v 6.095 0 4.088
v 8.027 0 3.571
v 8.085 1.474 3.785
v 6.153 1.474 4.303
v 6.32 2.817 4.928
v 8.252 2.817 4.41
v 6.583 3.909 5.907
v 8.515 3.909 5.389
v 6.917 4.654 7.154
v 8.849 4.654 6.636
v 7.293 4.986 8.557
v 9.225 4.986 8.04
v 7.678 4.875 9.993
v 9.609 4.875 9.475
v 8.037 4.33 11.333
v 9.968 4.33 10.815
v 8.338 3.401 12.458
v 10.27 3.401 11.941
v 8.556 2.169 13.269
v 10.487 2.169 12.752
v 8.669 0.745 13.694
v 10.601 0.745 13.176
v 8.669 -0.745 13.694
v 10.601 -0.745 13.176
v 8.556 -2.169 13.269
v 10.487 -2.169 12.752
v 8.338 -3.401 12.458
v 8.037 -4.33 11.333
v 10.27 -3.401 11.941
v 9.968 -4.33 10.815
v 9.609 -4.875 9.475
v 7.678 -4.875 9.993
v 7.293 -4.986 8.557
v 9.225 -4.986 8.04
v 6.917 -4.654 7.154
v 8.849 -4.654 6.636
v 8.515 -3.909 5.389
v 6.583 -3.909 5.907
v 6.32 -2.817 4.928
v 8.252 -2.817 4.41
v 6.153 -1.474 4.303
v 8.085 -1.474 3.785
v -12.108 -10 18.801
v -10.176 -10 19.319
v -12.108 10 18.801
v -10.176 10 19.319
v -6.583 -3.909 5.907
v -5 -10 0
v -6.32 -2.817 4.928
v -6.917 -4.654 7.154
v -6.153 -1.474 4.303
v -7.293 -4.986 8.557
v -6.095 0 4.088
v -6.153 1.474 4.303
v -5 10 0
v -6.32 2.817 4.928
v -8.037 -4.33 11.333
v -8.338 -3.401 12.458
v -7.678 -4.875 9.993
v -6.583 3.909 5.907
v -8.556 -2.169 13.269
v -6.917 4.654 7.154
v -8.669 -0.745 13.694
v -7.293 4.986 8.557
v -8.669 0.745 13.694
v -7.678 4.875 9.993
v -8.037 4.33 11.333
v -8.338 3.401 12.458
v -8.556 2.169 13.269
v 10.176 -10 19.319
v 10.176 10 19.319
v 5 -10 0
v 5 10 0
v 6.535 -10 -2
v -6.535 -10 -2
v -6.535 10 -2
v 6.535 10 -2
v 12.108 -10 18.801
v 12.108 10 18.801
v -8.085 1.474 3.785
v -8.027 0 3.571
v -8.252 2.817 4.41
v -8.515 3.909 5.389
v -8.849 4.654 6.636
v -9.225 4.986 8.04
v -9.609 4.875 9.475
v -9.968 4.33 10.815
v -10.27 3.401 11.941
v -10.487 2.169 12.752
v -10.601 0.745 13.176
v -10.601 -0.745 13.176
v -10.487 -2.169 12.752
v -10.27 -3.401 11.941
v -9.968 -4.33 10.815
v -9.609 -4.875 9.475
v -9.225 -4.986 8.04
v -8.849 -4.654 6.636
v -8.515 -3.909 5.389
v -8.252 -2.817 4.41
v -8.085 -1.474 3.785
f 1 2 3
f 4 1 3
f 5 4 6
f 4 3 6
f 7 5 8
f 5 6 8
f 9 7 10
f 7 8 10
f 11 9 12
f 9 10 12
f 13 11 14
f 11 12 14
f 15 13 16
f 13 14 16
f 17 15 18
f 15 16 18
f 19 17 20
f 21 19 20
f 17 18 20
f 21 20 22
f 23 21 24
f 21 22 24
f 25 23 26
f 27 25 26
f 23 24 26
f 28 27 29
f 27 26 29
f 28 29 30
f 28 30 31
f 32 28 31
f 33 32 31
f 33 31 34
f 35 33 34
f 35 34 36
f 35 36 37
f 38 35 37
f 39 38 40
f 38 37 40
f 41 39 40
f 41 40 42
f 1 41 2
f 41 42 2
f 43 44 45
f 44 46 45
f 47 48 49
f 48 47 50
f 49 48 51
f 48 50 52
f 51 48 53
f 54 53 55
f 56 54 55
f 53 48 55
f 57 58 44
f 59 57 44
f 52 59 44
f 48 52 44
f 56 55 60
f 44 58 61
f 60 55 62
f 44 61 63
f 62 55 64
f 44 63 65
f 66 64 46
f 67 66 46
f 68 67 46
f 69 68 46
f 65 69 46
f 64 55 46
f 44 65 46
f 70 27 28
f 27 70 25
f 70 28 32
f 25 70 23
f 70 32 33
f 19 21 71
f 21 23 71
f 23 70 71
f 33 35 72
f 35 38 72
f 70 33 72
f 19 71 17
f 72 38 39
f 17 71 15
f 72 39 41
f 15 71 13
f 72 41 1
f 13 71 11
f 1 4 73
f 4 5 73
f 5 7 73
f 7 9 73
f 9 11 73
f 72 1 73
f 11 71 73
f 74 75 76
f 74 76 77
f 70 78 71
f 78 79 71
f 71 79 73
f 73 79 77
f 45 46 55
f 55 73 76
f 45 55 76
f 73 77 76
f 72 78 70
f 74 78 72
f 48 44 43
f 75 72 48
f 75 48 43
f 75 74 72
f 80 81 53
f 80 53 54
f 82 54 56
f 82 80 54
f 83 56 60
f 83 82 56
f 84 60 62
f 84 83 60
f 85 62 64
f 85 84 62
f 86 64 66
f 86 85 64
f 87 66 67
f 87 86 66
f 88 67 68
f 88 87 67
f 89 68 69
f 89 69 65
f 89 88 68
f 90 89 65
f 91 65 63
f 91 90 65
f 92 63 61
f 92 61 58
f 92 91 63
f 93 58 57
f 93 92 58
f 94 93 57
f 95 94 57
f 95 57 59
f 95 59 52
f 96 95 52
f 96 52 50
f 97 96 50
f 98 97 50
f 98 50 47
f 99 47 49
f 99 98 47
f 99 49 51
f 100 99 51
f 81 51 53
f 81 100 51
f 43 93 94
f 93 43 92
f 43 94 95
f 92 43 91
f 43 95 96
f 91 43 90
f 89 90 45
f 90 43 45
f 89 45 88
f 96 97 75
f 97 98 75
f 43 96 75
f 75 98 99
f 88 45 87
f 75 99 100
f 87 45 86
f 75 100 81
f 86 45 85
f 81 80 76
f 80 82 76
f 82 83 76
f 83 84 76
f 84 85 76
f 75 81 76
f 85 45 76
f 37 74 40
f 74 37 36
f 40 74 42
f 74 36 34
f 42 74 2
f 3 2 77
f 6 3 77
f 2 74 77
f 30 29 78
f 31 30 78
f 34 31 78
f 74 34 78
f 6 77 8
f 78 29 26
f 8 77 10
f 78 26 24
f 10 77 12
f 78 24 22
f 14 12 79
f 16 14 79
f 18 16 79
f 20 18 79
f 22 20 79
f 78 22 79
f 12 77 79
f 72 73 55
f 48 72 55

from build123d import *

# Parameters (mm, degrees)
AUFSATZ_LINEAR_AUSTRAGEN1_DEPTH = 10
SKIZZE2_R                       = 5
SCHNITT_LINEAR_AUSTRAGEN1_DEPTH = 2


with BuildPart() as part:
    # Skizze1 → Aufsatz-Linear austragen1 (new body, symmetric)
    with BuildSketch(Plane(origin=(0, 0, 0), x_dir=(1, 0, 0), z_dir=(0, 1, 0))):
        Polygon((-5, 0), (-10.176380902, -19.318516526), (-12.108232555, -18.800878436), (-6.534653976, 2), (6.534653976, 2), (12.108232555, -18.800878436), (10.176380902, -19.318516526), (5, 0), align=None)
    extrude(amount=AUFSATZ_LINEAR_AUSTRAGEN1_DEPTH, both=True)

    # Skizze2 → Schnitt-Linear austragen1 (cut)
    with BuildSketch(Plane(origin=(6.596915162, 0, -1.76763809), x_dir=(-0.258819045, 0, -0.965925826), z_dir=(0.965925826, 0, -0.258819045))):
        with Locations((-10.526768238, 0)):
            Circle(SKIZZE2_R)
    schnitt_linear_austragen1 = extrude(amount=-SCHNITT_LINEAR_AUSTRAGEN1_DEPTH, mode=Mode.SUBTRACT)

    # Spiegeln1: Schnitt-Linear austragen1 across plane
    add(schnitt_linear_austragen1.mirror(Plane(origin=(0, 0, 0), x_dir=(0, 0, 1), z_dir=(1, 0, 0))), mode=Mode.SUBTRACT)


solid = part.part
